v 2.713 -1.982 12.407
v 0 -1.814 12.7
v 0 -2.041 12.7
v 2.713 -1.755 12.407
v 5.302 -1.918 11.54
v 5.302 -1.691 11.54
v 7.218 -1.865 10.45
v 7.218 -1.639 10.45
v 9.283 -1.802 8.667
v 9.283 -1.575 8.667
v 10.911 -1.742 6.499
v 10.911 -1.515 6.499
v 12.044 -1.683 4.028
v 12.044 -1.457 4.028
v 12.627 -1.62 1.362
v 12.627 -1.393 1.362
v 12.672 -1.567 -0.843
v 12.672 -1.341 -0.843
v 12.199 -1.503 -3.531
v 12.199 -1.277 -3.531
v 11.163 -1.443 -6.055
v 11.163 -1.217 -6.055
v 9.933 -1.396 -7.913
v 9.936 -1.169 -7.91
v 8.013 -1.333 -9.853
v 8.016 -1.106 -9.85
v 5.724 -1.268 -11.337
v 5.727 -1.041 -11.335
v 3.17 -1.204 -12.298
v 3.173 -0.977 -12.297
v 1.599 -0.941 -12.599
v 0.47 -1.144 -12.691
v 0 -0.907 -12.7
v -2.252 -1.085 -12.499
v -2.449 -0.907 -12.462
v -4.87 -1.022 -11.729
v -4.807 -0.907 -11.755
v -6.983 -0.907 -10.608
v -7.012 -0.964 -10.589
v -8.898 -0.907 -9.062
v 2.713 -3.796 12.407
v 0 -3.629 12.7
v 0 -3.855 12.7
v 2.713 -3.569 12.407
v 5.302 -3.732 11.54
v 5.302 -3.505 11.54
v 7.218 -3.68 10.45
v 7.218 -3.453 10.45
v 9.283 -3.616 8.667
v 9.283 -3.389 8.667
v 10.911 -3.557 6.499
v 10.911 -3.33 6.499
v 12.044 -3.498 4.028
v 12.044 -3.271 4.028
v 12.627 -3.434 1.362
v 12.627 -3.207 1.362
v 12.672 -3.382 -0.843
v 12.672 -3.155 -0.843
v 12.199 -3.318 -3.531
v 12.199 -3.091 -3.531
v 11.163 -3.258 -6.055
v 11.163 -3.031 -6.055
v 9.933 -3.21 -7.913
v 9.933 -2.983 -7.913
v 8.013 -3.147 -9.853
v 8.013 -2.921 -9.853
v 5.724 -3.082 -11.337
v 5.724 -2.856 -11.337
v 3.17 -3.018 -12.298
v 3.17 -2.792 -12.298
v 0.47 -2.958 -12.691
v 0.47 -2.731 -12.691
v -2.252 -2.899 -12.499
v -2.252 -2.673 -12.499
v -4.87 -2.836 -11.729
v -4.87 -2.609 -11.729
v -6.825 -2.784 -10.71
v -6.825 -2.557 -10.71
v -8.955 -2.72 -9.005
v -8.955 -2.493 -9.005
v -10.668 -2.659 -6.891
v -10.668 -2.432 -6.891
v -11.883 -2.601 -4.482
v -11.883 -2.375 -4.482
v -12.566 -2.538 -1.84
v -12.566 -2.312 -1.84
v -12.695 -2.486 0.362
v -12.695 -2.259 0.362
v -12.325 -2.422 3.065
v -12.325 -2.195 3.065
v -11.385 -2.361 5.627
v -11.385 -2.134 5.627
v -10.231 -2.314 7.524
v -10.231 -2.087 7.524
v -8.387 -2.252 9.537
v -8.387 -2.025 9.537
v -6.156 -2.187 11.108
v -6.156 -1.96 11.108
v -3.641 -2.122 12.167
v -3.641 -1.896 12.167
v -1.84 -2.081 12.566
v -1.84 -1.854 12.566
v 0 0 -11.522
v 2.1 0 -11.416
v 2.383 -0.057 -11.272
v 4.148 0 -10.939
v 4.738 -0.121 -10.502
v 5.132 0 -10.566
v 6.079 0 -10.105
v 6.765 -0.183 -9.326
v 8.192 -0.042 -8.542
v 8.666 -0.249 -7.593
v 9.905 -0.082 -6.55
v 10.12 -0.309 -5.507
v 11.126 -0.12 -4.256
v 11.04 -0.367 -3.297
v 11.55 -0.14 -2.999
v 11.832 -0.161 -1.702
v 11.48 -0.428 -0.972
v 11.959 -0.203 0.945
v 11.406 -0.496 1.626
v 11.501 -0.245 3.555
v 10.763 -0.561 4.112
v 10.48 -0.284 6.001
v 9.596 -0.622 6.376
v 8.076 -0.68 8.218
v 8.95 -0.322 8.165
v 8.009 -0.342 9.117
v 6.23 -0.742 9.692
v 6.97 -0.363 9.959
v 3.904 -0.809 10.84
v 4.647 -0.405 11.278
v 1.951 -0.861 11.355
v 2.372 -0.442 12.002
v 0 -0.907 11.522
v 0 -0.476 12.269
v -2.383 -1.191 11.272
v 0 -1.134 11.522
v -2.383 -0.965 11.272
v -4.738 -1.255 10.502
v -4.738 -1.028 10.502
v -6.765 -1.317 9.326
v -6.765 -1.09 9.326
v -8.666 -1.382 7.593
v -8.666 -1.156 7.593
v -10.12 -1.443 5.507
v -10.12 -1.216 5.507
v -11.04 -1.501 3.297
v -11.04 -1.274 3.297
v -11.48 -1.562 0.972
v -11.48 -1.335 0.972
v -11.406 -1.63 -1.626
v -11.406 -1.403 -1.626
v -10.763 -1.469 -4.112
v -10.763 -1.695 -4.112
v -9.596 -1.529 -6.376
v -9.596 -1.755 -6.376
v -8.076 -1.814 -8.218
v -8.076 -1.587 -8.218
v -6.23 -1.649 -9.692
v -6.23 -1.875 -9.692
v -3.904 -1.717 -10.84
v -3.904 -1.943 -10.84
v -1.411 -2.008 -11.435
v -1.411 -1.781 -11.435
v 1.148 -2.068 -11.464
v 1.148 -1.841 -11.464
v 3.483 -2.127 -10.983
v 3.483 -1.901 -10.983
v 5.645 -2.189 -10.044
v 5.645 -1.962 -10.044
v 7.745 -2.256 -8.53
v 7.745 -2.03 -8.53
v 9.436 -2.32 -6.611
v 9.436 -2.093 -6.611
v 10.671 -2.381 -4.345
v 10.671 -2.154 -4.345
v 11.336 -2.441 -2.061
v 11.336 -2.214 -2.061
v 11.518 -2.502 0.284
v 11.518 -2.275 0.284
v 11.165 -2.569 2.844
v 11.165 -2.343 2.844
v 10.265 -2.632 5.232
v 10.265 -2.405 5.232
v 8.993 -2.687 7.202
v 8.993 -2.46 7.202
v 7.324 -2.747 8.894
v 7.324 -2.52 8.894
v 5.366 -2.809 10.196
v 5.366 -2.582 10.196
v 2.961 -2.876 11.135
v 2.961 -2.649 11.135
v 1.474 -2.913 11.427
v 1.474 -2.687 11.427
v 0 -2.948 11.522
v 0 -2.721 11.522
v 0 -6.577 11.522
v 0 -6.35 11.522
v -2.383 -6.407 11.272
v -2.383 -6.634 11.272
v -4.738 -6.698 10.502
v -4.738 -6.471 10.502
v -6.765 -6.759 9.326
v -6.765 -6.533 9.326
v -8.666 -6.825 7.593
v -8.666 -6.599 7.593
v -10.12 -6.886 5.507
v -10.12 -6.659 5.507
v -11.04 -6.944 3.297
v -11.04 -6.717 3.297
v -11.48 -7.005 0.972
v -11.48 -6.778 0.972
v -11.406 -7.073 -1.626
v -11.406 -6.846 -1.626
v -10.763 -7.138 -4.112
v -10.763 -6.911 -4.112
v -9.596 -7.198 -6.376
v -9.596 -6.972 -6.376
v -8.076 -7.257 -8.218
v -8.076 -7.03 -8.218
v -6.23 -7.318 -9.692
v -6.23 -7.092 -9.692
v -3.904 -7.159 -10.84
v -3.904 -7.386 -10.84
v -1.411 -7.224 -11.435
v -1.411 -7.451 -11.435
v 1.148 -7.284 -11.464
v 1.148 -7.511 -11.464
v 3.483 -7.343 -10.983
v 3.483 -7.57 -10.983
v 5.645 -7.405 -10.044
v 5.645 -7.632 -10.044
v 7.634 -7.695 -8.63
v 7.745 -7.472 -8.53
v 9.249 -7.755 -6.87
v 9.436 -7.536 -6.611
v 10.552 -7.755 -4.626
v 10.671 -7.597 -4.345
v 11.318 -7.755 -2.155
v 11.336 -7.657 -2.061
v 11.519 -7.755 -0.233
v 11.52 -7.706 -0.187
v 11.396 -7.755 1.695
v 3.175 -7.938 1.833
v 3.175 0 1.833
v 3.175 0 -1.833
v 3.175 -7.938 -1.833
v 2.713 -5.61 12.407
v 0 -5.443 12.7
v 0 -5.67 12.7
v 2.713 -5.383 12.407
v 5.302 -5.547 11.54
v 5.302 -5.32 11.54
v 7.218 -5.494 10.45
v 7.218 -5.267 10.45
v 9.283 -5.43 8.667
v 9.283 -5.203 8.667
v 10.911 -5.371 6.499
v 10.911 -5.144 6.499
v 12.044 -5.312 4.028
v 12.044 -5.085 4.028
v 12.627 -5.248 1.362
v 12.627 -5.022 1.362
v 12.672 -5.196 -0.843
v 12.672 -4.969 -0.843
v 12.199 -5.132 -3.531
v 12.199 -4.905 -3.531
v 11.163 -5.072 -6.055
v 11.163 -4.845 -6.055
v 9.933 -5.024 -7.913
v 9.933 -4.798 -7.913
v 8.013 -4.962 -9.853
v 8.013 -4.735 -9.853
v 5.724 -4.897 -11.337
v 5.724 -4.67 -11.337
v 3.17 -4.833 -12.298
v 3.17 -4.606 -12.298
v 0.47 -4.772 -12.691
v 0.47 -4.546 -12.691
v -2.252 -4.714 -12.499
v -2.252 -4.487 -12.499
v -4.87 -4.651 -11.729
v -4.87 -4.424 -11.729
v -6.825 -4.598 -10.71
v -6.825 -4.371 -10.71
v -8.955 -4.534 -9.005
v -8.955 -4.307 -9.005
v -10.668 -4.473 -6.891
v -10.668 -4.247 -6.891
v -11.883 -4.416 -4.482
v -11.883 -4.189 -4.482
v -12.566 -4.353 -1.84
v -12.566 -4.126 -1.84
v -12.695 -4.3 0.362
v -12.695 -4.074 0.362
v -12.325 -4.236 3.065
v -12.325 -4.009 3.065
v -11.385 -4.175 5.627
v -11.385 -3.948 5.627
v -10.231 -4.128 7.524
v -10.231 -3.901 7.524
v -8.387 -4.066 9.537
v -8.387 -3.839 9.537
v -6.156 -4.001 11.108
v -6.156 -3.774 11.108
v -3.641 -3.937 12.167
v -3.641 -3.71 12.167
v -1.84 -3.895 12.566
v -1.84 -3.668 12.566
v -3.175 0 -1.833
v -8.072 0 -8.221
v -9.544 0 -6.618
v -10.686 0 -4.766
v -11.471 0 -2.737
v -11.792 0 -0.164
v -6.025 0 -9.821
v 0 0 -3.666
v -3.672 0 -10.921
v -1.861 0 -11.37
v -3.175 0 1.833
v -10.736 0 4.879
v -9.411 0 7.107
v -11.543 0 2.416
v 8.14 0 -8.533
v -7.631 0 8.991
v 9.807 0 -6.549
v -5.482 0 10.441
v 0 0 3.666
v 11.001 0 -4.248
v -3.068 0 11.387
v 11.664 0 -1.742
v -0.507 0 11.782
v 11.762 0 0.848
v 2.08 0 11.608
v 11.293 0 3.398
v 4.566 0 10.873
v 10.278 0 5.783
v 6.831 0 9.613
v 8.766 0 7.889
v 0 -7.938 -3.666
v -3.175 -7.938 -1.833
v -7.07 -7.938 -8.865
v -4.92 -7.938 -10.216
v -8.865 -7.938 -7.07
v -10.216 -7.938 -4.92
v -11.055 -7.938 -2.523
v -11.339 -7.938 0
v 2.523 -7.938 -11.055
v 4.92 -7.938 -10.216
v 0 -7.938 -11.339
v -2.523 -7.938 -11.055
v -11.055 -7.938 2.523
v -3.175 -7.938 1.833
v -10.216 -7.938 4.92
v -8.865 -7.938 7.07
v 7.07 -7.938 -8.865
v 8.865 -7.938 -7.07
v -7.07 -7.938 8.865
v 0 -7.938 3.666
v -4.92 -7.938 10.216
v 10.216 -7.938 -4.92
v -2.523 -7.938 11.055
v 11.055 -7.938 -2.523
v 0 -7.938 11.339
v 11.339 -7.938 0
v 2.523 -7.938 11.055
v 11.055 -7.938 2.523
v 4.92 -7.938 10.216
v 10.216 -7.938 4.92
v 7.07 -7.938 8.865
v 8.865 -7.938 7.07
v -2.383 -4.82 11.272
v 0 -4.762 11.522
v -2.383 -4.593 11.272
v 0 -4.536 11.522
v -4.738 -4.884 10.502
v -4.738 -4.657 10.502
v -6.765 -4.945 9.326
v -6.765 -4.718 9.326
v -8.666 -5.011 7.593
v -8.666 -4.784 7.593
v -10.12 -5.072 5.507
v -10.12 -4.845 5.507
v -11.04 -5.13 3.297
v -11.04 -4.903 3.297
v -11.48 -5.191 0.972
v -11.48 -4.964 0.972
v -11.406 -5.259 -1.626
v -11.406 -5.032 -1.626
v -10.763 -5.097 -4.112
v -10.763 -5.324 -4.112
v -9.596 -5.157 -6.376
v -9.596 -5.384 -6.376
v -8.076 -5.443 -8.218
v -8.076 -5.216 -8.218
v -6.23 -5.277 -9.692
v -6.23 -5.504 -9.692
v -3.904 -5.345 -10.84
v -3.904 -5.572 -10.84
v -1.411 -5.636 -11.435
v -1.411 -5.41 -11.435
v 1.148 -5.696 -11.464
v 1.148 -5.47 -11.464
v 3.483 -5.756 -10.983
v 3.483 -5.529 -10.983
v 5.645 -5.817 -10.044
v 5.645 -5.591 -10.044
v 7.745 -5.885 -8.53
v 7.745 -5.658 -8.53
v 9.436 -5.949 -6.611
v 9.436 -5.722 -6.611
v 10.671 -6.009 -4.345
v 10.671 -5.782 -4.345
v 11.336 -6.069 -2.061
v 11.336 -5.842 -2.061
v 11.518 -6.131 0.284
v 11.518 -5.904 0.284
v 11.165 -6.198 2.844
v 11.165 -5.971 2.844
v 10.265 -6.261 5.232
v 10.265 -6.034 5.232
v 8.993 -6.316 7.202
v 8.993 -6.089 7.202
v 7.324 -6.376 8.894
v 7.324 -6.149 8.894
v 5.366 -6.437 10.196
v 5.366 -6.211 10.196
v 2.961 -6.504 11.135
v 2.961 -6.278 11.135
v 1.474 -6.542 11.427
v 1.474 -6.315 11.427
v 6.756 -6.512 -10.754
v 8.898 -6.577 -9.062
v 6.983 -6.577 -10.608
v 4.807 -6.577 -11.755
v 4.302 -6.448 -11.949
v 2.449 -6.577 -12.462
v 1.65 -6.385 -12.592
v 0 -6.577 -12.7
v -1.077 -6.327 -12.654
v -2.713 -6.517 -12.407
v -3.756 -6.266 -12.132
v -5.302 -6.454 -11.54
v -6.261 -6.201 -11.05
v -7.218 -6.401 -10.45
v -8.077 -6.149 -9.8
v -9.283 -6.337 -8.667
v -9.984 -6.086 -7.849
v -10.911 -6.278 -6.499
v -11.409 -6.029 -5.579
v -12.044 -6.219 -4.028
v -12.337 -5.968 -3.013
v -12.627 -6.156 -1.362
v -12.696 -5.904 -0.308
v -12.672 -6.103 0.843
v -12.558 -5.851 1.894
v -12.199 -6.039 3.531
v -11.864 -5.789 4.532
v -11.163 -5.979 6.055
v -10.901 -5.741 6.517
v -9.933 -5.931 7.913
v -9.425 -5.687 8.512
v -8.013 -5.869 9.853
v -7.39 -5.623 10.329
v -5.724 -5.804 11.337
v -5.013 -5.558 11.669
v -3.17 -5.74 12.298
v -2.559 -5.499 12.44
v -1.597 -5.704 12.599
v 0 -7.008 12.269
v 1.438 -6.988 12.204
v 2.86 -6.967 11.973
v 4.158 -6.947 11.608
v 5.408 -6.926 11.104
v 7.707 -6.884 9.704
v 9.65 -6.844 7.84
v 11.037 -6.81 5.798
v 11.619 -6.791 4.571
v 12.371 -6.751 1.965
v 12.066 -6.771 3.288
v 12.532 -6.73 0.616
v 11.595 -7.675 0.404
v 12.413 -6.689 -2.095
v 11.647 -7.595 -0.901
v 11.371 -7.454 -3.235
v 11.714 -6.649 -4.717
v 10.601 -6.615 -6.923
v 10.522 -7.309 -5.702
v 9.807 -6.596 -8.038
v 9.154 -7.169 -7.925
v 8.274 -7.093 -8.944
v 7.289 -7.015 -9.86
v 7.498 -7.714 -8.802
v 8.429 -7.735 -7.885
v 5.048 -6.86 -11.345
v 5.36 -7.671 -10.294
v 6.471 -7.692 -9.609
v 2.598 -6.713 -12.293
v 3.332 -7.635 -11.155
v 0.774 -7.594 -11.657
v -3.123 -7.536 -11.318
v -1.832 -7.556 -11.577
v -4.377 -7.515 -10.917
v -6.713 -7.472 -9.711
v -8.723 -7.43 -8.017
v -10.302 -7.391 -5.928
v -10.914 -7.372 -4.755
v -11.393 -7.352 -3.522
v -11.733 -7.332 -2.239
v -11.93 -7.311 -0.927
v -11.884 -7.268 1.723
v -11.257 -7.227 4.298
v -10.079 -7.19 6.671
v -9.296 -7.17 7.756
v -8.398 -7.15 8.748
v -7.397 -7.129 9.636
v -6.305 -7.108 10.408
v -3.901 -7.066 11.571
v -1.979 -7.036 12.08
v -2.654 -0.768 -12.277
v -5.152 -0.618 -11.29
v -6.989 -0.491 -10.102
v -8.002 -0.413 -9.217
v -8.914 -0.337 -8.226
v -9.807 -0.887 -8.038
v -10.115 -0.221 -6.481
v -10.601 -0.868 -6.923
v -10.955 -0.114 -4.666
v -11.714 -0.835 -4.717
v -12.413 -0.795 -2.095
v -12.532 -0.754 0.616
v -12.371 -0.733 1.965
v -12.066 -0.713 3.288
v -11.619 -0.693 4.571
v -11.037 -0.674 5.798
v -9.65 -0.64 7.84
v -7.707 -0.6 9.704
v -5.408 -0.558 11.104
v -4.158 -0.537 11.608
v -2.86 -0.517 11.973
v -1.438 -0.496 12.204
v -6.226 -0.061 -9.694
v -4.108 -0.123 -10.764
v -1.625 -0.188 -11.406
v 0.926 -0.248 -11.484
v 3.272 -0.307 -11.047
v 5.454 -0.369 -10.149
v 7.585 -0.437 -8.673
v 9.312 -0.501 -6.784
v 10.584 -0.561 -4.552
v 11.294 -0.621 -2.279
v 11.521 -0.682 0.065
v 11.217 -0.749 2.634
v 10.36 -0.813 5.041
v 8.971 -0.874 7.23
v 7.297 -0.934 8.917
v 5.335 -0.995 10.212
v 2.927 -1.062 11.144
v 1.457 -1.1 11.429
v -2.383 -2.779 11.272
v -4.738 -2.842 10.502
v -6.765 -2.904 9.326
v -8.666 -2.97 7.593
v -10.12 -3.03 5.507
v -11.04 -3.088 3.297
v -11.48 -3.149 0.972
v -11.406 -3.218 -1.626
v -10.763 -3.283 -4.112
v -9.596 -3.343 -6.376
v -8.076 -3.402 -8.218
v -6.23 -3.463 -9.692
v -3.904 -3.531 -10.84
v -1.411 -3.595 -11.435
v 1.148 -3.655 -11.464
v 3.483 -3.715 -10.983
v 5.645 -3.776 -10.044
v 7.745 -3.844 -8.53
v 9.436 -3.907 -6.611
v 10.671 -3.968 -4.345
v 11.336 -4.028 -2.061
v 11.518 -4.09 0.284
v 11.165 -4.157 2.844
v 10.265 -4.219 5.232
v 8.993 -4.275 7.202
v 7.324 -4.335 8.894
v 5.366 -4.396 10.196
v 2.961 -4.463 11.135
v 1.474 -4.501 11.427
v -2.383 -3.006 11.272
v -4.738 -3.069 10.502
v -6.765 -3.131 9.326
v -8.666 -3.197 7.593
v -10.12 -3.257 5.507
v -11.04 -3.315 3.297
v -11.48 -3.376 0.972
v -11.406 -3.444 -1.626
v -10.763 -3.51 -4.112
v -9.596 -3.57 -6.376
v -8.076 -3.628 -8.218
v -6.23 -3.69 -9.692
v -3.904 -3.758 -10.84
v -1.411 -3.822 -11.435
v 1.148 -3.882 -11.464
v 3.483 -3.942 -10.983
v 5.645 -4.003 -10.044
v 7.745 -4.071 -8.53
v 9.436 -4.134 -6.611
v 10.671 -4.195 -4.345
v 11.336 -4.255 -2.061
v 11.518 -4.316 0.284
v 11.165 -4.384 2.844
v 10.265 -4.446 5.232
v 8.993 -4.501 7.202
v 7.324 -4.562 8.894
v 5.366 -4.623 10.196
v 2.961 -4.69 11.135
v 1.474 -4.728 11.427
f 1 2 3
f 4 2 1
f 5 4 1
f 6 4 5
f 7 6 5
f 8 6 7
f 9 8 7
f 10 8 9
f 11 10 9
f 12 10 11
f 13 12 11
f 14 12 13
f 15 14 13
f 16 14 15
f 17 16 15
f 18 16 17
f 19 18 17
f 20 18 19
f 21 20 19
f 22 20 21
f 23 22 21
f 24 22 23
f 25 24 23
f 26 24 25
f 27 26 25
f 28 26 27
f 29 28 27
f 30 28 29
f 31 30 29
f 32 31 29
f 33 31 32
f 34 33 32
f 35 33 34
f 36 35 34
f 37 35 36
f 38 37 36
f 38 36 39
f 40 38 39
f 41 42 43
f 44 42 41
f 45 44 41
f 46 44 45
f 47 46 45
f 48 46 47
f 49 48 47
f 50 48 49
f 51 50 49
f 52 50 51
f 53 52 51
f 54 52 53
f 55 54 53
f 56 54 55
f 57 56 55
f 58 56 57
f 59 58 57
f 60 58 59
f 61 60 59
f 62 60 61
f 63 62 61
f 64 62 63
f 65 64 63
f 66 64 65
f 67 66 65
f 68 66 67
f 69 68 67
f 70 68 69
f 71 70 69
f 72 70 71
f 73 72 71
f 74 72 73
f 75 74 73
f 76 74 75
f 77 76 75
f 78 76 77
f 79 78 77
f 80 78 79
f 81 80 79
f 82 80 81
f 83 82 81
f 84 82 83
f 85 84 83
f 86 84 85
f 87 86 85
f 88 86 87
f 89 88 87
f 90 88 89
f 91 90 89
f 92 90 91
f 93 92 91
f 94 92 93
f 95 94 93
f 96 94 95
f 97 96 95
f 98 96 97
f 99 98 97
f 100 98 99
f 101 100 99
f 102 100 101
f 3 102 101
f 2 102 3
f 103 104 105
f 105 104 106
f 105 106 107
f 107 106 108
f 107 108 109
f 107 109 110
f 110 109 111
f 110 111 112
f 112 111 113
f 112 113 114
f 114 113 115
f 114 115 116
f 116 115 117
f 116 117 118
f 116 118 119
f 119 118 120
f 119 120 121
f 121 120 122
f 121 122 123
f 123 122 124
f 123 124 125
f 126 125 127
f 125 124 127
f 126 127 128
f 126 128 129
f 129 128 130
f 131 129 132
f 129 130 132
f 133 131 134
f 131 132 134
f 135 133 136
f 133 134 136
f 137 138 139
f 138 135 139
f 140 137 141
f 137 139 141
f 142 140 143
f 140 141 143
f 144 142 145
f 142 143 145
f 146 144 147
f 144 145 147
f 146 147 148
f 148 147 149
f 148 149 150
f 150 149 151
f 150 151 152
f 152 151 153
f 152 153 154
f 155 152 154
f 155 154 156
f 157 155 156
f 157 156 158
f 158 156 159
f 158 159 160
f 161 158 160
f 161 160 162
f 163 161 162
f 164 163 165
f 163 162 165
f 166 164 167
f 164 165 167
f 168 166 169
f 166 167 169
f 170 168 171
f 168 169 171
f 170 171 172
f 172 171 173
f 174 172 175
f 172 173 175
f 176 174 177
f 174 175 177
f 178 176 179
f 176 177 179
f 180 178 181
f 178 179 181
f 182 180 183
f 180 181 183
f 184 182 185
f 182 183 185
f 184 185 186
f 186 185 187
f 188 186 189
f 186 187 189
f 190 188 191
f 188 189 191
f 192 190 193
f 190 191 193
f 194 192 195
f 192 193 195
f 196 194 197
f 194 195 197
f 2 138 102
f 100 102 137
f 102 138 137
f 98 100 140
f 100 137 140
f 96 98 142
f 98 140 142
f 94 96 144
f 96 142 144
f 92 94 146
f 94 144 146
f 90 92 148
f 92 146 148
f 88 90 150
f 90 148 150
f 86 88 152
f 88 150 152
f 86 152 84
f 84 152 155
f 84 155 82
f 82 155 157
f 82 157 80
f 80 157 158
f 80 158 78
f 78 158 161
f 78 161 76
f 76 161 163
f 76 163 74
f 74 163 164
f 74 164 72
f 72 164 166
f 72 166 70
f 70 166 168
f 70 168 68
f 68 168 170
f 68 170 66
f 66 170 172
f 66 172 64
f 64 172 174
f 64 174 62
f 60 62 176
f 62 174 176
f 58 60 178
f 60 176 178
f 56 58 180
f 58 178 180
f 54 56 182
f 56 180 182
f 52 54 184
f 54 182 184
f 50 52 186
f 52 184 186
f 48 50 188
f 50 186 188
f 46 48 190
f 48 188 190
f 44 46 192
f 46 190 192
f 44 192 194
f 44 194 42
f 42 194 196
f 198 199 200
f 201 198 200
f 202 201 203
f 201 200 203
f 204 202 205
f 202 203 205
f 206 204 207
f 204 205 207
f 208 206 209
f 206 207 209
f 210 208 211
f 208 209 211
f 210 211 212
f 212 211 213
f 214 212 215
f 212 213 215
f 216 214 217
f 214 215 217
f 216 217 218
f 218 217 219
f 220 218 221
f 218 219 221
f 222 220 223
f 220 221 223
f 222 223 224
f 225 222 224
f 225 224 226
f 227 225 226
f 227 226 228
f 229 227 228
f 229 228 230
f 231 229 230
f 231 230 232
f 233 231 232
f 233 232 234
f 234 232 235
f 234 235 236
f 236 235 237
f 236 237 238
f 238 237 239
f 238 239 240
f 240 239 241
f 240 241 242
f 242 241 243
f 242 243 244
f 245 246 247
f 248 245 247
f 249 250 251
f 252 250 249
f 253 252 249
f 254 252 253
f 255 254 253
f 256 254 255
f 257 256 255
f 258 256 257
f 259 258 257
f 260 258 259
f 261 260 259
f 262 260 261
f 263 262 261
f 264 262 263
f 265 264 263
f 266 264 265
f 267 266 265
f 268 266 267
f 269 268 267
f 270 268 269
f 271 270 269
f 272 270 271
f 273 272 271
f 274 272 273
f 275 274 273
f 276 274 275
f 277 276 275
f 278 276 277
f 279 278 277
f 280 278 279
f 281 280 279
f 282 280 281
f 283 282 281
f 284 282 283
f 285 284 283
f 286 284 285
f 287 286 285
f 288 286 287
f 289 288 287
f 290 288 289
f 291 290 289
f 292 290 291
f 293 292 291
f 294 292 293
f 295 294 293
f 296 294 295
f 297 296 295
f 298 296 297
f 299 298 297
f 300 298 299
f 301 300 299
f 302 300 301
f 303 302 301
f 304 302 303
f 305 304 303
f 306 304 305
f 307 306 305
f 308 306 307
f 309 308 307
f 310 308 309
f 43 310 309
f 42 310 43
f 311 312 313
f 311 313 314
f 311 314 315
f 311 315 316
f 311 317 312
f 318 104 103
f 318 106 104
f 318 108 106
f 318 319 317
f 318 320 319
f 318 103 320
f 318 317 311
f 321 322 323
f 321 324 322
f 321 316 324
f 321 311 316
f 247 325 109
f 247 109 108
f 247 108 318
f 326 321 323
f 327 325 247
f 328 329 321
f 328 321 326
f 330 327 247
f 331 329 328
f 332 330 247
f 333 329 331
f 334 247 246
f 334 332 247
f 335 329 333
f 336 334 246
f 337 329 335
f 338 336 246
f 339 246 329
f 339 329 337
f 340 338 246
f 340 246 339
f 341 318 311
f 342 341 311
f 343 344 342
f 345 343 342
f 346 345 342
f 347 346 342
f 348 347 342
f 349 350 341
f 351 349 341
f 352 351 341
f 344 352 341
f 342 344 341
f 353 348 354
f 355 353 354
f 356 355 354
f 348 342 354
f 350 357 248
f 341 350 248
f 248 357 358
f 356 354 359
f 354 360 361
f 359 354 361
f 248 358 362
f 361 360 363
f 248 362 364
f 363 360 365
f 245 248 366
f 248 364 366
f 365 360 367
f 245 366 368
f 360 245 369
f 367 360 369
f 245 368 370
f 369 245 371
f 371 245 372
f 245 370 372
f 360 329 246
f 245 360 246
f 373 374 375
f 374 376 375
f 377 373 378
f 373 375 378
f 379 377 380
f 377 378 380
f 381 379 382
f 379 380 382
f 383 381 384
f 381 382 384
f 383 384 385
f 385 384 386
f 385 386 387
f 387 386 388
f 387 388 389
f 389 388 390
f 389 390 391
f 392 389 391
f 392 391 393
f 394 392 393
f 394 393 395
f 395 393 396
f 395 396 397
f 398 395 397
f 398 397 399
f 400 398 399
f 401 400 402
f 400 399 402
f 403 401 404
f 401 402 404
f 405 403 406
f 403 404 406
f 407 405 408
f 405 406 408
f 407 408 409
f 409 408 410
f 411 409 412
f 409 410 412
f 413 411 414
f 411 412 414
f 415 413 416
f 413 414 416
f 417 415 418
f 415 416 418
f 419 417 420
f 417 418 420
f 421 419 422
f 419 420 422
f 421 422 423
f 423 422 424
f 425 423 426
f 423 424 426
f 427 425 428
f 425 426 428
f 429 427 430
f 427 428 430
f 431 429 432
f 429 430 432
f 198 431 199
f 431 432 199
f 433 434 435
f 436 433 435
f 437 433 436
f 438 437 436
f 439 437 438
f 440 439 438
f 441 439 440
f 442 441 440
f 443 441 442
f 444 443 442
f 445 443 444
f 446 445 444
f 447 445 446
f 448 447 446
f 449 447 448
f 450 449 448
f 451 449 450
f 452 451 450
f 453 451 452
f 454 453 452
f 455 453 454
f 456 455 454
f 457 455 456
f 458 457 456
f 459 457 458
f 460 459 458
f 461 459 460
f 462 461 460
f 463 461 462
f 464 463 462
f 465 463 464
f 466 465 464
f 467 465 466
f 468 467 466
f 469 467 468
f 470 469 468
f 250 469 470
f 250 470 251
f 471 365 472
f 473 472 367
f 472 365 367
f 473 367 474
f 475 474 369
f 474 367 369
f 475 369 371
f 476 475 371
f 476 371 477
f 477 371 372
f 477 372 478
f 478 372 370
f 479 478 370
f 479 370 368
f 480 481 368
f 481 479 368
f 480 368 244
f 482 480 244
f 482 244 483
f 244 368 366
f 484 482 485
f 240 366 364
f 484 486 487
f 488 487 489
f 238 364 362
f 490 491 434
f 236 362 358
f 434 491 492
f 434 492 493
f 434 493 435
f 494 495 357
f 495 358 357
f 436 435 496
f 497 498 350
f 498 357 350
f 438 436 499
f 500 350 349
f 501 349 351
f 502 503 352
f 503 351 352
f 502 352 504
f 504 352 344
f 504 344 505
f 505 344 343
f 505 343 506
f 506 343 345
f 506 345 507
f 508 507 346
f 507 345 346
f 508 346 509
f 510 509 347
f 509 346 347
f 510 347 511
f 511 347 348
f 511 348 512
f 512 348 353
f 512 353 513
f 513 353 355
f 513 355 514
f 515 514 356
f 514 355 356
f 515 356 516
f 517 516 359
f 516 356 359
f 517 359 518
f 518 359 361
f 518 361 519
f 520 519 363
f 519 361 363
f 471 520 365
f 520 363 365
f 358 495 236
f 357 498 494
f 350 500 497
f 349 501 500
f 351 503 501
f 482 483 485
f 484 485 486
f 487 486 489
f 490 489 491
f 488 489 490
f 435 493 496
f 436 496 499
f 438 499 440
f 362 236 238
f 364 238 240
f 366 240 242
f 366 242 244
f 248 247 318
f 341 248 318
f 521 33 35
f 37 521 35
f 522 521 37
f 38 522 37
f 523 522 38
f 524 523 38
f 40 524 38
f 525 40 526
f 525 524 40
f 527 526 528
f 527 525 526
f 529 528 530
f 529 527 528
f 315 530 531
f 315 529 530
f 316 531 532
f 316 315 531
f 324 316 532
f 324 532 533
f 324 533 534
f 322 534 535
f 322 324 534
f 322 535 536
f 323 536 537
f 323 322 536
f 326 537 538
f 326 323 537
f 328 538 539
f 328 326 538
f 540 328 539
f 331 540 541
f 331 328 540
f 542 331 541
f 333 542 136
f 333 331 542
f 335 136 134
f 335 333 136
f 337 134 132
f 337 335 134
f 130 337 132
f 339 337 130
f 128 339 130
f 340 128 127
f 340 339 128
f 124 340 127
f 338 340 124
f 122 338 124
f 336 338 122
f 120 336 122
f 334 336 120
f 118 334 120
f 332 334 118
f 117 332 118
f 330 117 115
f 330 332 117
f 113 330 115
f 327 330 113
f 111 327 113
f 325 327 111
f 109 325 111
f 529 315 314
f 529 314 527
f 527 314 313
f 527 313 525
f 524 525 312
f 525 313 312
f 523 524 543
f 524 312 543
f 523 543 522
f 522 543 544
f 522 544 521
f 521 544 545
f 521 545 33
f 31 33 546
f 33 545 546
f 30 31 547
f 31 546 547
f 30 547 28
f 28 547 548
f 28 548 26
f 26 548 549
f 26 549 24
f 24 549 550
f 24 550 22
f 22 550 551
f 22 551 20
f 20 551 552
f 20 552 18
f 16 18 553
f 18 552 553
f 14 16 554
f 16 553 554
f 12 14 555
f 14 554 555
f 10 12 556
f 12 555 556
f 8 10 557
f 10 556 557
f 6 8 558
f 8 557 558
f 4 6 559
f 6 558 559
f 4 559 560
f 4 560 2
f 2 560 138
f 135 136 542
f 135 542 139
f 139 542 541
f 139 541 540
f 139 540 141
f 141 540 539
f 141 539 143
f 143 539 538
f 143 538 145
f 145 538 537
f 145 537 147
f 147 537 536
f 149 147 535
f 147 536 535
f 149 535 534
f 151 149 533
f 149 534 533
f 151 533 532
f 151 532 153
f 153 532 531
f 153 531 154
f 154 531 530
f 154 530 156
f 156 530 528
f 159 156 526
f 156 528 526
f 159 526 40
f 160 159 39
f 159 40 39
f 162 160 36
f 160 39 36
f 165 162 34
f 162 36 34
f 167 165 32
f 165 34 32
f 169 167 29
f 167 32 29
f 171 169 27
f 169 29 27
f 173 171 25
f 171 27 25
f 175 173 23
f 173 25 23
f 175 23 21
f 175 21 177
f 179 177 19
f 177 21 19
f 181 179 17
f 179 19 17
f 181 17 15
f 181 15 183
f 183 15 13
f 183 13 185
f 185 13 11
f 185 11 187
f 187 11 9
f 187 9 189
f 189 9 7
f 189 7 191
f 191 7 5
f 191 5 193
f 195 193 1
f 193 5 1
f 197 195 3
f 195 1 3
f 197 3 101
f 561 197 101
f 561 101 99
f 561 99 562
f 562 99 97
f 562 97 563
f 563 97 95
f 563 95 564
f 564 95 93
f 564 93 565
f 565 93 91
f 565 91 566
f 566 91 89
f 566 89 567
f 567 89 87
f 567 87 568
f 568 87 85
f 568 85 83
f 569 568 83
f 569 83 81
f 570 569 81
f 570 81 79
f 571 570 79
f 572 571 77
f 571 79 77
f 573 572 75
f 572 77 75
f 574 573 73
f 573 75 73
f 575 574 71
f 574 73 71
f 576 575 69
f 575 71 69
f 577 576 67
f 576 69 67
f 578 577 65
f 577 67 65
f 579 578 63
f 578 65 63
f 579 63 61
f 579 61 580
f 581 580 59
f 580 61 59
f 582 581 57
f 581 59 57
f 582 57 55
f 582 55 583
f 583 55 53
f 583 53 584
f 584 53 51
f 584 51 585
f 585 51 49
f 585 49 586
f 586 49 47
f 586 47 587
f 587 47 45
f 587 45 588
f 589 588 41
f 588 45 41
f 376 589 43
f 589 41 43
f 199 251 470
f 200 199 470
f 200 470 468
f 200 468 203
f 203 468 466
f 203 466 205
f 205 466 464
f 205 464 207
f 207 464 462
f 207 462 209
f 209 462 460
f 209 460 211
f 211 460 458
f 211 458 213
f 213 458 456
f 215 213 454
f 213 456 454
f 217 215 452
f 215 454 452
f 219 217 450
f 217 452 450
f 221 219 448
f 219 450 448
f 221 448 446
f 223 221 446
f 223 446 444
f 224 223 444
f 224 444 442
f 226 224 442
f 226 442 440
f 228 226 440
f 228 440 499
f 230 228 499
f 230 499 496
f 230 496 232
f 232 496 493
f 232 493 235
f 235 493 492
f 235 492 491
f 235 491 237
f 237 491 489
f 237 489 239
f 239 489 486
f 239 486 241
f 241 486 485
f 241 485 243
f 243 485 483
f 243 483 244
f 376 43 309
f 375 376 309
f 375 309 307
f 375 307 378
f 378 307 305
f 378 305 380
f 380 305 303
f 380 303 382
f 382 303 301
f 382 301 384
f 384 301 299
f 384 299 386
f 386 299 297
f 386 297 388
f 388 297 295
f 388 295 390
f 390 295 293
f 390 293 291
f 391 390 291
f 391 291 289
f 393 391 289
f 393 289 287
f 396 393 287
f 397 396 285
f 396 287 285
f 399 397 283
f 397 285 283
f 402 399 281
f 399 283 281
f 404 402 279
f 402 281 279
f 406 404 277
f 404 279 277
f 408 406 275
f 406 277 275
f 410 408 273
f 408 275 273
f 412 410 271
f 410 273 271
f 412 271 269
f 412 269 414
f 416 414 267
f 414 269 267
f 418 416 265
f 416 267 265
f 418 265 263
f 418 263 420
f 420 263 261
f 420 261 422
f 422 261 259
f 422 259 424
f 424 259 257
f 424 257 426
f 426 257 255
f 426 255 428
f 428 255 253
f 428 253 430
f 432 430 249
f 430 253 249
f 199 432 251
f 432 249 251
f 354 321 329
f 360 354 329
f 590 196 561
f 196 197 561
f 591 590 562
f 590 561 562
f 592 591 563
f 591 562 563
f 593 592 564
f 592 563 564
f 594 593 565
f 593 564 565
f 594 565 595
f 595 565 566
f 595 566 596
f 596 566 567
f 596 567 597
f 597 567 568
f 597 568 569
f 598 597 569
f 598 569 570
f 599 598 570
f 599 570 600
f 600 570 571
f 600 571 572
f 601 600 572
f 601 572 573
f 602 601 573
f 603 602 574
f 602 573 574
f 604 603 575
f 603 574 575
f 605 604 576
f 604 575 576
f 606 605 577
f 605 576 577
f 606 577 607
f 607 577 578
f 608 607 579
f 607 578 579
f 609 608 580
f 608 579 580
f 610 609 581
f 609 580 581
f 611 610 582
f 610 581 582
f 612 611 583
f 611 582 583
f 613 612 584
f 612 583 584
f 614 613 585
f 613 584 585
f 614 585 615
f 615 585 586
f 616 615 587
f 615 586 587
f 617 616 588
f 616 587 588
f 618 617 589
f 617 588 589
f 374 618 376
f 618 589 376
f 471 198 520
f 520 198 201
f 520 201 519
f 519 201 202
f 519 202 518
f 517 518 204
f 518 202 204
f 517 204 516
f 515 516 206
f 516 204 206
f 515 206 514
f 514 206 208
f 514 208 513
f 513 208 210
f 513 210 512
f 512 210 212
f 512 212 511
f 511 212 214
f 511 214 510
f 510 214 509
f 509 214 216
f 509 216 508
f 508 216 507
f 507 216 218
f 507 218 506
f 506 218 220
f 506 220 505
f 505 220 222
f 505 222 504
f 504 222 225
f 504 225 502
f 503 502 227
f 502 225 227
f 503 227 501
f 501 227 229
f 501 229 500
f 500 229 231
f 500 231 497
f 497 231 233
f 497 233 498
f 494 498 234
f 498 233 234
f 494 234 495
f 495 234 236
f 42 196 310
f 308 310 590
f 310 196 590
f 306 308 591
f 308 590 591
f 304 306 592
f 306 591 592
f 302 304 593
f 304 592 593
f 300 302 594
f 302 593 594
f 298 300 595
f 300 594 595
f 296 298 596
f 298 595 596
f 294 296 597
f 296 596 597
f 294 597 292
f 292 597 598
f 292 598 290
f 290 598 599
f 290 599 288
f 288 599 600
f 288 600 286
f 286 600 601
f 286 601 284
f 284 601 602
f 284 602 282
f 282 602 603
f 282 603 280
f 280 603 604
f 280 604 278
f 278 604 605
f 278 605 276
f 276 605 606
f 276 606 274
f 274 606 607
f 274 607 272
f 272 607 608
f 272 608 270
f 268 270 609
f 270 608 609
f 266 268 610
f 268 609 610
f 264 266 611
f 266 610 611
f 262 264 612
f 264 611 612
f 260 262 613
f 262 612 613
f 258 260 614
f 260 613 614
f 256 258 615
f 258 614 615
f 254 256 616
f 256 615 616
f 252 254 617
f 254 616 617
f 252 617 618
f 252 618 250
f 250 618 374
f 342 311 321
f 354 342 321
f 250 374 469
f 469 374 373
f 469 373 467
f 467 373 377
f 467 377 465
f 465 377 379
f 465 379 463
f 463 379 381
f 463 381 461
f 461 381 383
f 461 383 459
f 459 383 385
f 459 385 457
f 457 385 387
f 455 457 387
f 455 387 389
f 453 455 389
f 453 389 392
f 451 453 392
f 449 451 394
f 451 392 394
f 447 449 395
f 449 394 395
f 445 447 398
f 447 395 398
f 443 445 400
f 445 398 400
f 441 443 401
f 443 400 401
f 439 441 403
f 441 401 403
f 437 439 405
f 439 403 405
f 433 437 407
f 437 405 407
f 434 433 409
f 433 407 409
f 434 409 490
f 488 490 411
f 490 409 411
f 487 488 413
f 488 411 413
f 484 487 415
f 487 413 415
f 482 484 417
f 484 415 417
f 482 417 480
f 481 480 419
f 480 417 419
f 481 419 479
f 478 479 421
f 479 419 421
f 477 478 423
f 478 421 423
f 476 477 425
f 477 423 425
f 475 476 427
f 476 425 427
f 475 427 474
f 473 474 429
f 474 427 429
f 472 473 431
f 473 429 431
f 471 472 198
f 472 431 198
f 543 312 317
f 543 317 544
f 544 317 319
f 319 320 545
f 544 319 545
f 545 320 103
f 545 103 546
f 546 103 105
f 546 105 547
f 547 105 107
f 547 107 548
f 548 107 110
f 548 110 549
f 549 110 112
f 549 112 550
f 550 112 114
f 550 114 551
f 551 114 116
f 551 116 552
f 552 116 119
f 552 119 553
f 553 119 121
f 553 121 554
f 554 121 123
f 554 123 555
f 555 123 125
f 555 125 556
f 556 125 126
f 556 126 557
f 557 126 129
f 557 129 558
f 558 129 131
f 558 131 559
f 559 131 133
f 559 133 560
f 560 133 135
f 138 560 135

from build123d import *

# Parameters (mm, degrees)
SKETCH1_R          = 12.7
EXTRUDE1_DEPTH     = 7.9375
CHAMFER1_SIZE      = 1.360714286
CHAMFER2_SIZE      = 0.907142857
CUT_SWEEP1_PITCH   = 1.814285714
CUT_EXTRUDE1_DEPTH = 20.636290712


with BuildPart() as part:
    # Sketch1 → Extrude1 (new body)
    with BuildSketch(Plane(origin=(0, 0, 0), x_dir=(1, 0, 0), z_dir=(0, 1, 0))):
        with Locations(Location((0, 0, 0), (0, 0, 270))):
            Circle(SKETCH1_R)
    extrude(amount=-EXTRUDE1_DEPTH)

    # Chamfer1
    chamfer1_edges = [part.edges().sort_by_distance(p)[0] for p in [
        (0, -7.9375, -12.7),
    ]]
    chamfer(chamfer1_edges, length=CHAMFER1_SIZE)

    # Chamfer2
    chamfer2_edges = [part.edges().sort_by_distance(p)[0] for p in [
        (0, 0, -12.7),
    ]]
    chamfer(chamfer2_edges, length=CHAMFER2_SIZE)

    # Cut-Sweep1: the profile of Sketch3 profile screwed along a right-hand helix of 5.375 turns, 6 arcs to a turn; built about Z, then put on its axis
    cut_sweep1_z = Axis((0, 0, 0), (0, 0, 1))
    cut_sweep1_corners = [(12.7003, 0, 0.000173205), (11.521586861, 0, -0.680357143), (11.521586861, 0, -0.907142857), (12.7003, 0, -1.587673205)]
    with BuildLine(mode=Mode.PRIVATE) as cut_sweep1_profile:
        Line(cut_sweep1_corners[0], cut_sweep1_corners[1])
        Line(cut_sweep1_corners[1], cut_sweep1_corners[2])
        Line(cut_sweep1_corners[2], cut_sweep1_corners[3])
        Line(cut_sweep1_corners[3], cut_sweep1_corners[0])
    cut_sweep1_cap = Face(cut_sweep1_profile.wire())
    cut_sweep1_turn_angles = [0, 30, 60, 90, 120, 150, 180, 210, 240, 270, 300, 330, 360]
    cut_sweep1_turn_weights = [1, 0.8660254037844387, 1, 0.8660254037844387, 1, 0.8660254037844387, 1, 0.8660254037844387, 1, 0.8660254037844387, 1, 0.8660254037844387, 1]
    cut_sweep1_turn_rails = [Edge.make_bspline([Vector(p[0], p[1], 0).rotate(cut_sweep1_z, cut_sweep1_turn_angles[k]) / cut_sweep1_turn_weights[k] + Vector(0, 0, p[2] + CUT_SWEEP1_PITCH * cut_sweep1_turn_angles[k] / 360) for k in range(13)], [0, 0, 0, 1, 1, 2, 2, 3, 3, 4, 4, 5, 5, 6, 6, 6], 2, cut_sweep1_turn_weights) for p in cut_sweep1_corners]
    cut_sweep1_turn_sides = [Face.make_surface_from_curves(cut_sweep1_turn_rails[p[0]], cut_sweep1_turn_rails[p[1]]) for p in [(0, 1), (1, 2), (2, 3), (3, 0)]]
    cut_sweep1_last_angles = [1800, 1830, 1860, 1890, 1920, 1927.5, 1935]
    cut_sweep1_last_weights = [1, 0.8660254037844387, 1, 0.8660254037844387, 1, 0.991444861373807, 1]
    cut_sweep1_last_rails = [Edge.make_bspline([Vector(p[0], p[1], 0).rotate(cut_sweep1_z, cut_sweep1_last_angles[k]) / cut_sweep1_last_weights[k] + Vector(0, 0, p[2] + CUT_SWEEP1_PITCH * cut_sweep1_last_angles[k] / 360) for k in range(7)], [0, 0, 0, 1, 1, 2, 2, 3, 3, 3], 2, cut_sweep1_last_weights) for p in cut_sweep1_corners]
    cut_sweep1_last_sides = [Face.make_surface_from_curves(cut_sweep1_last_rails[p[0]], cut_sweep1_last_rails[p[1]]) for p in [(0, 1), (1, 2), (2, 3), (3, 0)]]
    cut_sweep1 = Plane(origin=(0, 0, 0), x_dir=(0, 0, 1), z_dir=(0, -1, 0)) * Solid(Shell([*[p.moved(Location((0, 0, CUT_SWEEP1_PITCH * i))) for i in range(5) for p in cut_sweep1_turn_sides], *cut_sweep1_last_sides, cut_sweep1_cap, cut_sweep1_cap.rotate(cut_sweep1_z, 1935).moved(Location((0, 0, CUT_SWEEP1_PITCH * 1935 / 360)))]))
    add(cut_sweep1, mode=Mode.SUBTRACT)

    # Sketch4 → Cut-Extrude1 (cut, through all)
    with BuildSketch(Plane(origin=(0, 0, 0), x_dir=(1, 0, 0), z_dir=(0, 1, 0))):
        Polygon((0, 3.666174209), (-3.175, 1.833087105), (-3.175, -1.833087105), (0, -3.666174209), (3.175, -1.833087105), (3.175, 1.833087105), align=None)
    extrude(amount=-CUT_EXTRUDE1_DEPTH, mode=Mode.SUBTRACT)


solid = part.part
